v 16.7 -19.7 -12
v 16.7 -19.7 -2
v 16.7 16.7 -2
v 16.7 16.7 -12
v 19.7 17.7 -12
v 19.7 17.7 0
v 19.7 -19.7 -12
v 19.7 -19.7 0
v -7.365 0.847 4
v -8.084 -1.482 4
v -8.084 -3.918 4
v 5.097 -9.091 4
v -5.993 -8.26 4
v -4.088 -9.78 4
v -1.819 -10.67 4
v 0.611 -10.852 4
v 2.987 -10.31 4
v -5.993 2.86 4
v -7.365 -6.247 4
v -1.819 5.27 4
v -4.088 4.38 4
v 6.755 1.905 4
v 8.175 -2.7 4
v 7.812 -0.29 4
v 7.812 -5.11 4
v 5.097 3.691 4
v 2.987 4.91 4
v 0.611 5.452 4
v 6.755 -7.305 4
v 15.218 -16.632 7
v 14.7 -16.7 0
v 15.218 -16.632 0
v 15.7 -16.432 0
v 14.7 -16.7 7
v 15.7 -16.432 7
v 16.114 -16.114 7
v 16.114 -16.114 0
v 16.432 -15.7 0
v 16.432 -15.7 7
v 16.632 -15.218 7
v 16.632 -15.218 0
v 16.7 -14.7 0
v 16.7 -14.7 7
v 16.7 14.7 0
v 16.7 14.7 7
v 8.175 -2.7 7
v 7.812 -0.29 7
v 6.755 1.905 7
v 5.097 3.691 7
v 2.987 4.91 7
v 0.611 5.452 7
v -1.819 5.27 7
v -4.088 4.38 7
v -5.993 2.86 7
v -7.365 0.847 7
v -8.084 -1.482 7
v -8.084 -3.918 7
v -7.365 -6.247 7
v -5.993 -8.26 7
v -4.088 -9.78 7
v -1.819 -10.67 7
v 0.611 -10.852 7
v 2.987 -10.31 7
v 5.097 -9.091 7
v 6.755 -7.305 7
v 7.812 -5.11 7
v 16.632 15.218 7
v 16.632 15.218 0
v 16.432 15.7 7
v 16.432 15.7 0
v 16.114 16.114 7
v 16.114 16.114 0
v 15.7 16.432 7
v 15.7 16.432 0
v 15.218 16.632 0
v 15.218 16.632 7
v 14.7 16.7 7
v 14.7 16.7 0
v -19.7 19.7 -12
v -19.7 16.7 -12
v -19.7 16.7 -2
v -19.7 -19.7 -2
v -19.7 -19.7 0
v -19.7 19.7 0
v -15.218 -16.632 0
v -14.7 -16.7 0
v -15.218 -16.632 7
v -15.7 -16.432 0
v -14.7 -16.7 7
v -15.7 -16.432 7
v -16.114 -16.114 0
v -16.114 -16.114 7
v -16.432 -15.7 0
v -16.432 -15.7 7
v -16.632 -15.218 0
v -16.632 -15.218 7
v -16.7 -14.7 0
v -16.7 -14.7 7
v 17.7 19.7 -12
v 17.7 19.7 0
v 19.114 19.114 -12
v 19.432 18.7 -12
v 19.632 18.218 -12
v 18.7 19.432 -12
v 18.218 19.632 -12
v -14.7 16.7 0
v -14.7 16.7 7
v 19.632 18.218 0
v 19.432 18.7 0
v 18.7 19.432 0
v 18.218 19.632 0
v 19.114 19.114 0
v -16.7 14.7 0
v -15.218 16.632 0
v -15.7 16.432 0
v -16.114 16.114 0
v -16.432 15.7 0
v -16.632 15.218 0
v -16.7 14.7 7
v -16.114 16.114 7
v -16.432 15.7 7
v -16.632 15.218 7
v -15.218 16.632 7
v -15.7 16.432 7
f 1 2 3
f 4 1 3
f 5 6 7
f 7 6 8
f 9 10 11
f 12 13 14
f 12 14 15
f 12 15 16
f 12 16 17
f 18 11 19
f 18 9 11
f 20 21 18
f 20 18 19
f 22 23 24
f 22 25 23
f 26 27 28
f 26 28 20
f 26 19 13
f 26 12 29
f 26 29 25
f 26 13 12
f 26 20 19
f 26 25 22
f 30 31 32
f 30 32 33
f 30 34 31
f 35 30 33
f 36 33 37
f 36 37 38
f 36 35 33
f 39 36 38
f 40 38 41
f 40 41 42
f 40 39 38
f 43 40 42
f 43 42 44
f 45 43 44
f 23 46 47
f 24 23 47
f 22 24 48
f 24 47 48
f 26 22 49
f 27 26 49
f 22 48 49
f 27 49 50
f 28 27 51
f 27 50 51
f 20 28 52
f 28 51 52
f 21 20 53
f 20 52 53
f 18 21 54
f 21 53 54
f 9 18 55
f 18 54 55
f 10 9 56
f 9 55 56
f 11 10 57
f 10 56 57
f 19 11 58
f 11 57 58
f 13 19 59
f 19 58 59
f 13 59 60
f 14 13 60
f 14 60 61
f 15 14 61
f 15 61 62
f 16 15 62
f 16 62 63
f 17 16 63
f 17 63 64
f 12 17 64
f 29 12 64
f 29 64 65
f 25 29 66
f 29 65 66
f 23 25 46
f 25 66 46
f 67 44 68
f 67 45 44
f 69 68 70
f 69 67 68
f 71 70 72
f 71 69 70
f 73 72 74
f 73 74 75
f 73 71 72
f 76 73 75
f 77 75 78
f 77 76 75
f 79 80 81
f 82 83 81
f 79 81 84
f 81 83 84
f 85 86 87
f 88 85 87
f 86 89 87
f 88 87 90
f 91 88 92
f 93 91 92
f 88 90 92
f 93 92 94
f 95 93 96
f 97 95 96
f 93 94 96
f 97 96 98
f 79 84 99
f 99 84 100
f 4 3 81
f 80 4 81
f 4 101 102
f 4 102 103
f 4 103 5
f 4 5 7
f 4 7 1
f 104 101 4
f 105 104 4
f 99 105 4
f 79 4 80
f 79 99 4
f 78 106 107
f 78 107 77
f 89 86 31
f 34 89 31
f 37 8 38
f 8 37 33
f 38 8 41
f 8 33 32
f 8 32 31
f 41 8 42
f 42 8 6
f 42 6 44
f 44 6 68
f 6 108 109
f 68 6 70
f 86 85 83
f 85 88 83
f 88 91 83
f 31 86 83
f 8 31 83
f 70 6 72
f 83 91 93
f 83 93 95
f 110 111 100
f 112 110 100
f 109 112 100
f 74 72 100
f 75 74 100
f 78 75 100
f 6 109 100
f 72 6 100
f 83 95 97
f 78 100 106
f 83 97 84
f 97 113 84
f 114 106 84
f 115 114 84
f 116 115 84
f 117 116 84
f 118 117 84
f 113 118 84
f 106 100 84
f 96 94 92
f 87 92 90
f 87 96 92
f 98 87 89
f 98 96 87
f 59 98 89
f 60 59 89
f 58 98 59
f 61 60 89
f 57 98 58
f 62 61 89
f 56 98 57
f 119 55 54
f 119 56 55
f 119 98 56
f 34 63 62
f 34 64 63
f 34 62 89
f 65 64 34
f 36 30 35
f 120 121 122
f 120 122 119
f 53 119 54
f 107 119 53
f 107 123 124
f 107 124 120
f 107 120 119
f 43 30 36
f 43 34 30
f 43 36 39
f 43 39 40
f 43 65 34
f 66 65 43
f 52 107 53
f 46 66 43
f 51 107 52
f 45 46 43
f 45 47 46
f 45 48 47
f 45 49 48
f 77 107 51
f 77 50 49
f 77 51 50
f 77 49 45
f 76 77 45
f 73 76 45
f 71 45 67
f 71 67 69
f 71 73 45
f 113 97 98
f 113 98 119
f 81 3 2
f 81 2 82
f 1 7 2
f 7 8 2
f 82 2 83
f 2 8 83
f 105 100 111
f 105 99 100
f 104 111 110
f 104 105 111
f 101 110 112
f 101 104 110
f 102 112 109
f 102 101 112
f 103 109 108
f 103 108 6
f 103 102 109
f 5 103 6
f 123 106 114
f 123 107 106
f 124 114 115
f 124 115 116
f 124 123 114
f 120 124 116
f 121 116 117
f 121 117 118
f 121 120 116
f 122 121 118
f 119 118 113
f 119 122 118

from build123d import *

# Parameters (mm, degrees)
ESQUISSE1_W             = 33.4
ESQUISSE1_H             = 33.4
BOSS_EXTRU_1_DEPTH      = 7
ESQUISSE2_R             = 8.175
ENL_V_MAT_EXTRU_1_DEPTH = 3
ESQUISSE3_W             = 39.4
ESQUISSE3_H             = 39.4
BOSS_EXTRU_2_DEPTH      = 2
BOSS_EXTRU_3_DEPTH      = 10
CONG_1_R                = 2


with BuildPart() as part:
    # Esquisse1 → Boss.-Extru.1 (new body)
    with BuildSketch(Plane.XY):
        Rectangle(ESQUISSE1_W, ESQUISSE1_H)
    extrude(amount=BOSS_EXTRU_1_DEPTH)

    # Esquisse2 → Enlèv. mat.-Extru.1 (cut)
    with BuildSketch(Plane.XY.offset(7)):
        with Locations((0, -2.7)):
            Circle(ESQUISSE2_R)
    extrude(amount=-ENL_V_MAT_EXTRU_1_DEPTH, mode=Mode.SUBTRACT)

    # Esquisse3 → Boss.-Extru.2 (add)
    with BuildSketch(Plane(origin=(0, 0, 0), x_dir=(-1, 0, 0), z_dir=(0, 0, -1))):
        Rectangle(ESQUISSE3_W, ESQUISSE3_H)
    extrude(amount=BOSS_EXTRU_2_DEPTH)

    # Esquisse4 → Boss.-Extru.3 (add)
    with BuildSketch(Plane(origin=(0, 0, -2), x_dir=(-1, 0, 0), z_dir=(0, 0, -1))):
        Polygon((19.7, 19.7), (-19.7, 19.7), (-19.7, -19.7), (-16.7, -19.7), (-16.7, 16.7), (19.7, 16.7), align=None)
    extrude(amount=BOSS_EXTRU_3_DEPTH)

    # Congé1
    cong_1_edges = [part.edges().sort_by_distance(p)[0] for p in [
        (19.7, 19.7, -6),
        (-16.7, 16.7, 3.5),
        (16.7, 16.7, 3.5),
        (16.7, -16.7, 3.5),
        (-16.7, -16.7, 3.5),
    ]]
    fillet(cong_1_edges, radius=CONG_1_R)


solid = part.part
